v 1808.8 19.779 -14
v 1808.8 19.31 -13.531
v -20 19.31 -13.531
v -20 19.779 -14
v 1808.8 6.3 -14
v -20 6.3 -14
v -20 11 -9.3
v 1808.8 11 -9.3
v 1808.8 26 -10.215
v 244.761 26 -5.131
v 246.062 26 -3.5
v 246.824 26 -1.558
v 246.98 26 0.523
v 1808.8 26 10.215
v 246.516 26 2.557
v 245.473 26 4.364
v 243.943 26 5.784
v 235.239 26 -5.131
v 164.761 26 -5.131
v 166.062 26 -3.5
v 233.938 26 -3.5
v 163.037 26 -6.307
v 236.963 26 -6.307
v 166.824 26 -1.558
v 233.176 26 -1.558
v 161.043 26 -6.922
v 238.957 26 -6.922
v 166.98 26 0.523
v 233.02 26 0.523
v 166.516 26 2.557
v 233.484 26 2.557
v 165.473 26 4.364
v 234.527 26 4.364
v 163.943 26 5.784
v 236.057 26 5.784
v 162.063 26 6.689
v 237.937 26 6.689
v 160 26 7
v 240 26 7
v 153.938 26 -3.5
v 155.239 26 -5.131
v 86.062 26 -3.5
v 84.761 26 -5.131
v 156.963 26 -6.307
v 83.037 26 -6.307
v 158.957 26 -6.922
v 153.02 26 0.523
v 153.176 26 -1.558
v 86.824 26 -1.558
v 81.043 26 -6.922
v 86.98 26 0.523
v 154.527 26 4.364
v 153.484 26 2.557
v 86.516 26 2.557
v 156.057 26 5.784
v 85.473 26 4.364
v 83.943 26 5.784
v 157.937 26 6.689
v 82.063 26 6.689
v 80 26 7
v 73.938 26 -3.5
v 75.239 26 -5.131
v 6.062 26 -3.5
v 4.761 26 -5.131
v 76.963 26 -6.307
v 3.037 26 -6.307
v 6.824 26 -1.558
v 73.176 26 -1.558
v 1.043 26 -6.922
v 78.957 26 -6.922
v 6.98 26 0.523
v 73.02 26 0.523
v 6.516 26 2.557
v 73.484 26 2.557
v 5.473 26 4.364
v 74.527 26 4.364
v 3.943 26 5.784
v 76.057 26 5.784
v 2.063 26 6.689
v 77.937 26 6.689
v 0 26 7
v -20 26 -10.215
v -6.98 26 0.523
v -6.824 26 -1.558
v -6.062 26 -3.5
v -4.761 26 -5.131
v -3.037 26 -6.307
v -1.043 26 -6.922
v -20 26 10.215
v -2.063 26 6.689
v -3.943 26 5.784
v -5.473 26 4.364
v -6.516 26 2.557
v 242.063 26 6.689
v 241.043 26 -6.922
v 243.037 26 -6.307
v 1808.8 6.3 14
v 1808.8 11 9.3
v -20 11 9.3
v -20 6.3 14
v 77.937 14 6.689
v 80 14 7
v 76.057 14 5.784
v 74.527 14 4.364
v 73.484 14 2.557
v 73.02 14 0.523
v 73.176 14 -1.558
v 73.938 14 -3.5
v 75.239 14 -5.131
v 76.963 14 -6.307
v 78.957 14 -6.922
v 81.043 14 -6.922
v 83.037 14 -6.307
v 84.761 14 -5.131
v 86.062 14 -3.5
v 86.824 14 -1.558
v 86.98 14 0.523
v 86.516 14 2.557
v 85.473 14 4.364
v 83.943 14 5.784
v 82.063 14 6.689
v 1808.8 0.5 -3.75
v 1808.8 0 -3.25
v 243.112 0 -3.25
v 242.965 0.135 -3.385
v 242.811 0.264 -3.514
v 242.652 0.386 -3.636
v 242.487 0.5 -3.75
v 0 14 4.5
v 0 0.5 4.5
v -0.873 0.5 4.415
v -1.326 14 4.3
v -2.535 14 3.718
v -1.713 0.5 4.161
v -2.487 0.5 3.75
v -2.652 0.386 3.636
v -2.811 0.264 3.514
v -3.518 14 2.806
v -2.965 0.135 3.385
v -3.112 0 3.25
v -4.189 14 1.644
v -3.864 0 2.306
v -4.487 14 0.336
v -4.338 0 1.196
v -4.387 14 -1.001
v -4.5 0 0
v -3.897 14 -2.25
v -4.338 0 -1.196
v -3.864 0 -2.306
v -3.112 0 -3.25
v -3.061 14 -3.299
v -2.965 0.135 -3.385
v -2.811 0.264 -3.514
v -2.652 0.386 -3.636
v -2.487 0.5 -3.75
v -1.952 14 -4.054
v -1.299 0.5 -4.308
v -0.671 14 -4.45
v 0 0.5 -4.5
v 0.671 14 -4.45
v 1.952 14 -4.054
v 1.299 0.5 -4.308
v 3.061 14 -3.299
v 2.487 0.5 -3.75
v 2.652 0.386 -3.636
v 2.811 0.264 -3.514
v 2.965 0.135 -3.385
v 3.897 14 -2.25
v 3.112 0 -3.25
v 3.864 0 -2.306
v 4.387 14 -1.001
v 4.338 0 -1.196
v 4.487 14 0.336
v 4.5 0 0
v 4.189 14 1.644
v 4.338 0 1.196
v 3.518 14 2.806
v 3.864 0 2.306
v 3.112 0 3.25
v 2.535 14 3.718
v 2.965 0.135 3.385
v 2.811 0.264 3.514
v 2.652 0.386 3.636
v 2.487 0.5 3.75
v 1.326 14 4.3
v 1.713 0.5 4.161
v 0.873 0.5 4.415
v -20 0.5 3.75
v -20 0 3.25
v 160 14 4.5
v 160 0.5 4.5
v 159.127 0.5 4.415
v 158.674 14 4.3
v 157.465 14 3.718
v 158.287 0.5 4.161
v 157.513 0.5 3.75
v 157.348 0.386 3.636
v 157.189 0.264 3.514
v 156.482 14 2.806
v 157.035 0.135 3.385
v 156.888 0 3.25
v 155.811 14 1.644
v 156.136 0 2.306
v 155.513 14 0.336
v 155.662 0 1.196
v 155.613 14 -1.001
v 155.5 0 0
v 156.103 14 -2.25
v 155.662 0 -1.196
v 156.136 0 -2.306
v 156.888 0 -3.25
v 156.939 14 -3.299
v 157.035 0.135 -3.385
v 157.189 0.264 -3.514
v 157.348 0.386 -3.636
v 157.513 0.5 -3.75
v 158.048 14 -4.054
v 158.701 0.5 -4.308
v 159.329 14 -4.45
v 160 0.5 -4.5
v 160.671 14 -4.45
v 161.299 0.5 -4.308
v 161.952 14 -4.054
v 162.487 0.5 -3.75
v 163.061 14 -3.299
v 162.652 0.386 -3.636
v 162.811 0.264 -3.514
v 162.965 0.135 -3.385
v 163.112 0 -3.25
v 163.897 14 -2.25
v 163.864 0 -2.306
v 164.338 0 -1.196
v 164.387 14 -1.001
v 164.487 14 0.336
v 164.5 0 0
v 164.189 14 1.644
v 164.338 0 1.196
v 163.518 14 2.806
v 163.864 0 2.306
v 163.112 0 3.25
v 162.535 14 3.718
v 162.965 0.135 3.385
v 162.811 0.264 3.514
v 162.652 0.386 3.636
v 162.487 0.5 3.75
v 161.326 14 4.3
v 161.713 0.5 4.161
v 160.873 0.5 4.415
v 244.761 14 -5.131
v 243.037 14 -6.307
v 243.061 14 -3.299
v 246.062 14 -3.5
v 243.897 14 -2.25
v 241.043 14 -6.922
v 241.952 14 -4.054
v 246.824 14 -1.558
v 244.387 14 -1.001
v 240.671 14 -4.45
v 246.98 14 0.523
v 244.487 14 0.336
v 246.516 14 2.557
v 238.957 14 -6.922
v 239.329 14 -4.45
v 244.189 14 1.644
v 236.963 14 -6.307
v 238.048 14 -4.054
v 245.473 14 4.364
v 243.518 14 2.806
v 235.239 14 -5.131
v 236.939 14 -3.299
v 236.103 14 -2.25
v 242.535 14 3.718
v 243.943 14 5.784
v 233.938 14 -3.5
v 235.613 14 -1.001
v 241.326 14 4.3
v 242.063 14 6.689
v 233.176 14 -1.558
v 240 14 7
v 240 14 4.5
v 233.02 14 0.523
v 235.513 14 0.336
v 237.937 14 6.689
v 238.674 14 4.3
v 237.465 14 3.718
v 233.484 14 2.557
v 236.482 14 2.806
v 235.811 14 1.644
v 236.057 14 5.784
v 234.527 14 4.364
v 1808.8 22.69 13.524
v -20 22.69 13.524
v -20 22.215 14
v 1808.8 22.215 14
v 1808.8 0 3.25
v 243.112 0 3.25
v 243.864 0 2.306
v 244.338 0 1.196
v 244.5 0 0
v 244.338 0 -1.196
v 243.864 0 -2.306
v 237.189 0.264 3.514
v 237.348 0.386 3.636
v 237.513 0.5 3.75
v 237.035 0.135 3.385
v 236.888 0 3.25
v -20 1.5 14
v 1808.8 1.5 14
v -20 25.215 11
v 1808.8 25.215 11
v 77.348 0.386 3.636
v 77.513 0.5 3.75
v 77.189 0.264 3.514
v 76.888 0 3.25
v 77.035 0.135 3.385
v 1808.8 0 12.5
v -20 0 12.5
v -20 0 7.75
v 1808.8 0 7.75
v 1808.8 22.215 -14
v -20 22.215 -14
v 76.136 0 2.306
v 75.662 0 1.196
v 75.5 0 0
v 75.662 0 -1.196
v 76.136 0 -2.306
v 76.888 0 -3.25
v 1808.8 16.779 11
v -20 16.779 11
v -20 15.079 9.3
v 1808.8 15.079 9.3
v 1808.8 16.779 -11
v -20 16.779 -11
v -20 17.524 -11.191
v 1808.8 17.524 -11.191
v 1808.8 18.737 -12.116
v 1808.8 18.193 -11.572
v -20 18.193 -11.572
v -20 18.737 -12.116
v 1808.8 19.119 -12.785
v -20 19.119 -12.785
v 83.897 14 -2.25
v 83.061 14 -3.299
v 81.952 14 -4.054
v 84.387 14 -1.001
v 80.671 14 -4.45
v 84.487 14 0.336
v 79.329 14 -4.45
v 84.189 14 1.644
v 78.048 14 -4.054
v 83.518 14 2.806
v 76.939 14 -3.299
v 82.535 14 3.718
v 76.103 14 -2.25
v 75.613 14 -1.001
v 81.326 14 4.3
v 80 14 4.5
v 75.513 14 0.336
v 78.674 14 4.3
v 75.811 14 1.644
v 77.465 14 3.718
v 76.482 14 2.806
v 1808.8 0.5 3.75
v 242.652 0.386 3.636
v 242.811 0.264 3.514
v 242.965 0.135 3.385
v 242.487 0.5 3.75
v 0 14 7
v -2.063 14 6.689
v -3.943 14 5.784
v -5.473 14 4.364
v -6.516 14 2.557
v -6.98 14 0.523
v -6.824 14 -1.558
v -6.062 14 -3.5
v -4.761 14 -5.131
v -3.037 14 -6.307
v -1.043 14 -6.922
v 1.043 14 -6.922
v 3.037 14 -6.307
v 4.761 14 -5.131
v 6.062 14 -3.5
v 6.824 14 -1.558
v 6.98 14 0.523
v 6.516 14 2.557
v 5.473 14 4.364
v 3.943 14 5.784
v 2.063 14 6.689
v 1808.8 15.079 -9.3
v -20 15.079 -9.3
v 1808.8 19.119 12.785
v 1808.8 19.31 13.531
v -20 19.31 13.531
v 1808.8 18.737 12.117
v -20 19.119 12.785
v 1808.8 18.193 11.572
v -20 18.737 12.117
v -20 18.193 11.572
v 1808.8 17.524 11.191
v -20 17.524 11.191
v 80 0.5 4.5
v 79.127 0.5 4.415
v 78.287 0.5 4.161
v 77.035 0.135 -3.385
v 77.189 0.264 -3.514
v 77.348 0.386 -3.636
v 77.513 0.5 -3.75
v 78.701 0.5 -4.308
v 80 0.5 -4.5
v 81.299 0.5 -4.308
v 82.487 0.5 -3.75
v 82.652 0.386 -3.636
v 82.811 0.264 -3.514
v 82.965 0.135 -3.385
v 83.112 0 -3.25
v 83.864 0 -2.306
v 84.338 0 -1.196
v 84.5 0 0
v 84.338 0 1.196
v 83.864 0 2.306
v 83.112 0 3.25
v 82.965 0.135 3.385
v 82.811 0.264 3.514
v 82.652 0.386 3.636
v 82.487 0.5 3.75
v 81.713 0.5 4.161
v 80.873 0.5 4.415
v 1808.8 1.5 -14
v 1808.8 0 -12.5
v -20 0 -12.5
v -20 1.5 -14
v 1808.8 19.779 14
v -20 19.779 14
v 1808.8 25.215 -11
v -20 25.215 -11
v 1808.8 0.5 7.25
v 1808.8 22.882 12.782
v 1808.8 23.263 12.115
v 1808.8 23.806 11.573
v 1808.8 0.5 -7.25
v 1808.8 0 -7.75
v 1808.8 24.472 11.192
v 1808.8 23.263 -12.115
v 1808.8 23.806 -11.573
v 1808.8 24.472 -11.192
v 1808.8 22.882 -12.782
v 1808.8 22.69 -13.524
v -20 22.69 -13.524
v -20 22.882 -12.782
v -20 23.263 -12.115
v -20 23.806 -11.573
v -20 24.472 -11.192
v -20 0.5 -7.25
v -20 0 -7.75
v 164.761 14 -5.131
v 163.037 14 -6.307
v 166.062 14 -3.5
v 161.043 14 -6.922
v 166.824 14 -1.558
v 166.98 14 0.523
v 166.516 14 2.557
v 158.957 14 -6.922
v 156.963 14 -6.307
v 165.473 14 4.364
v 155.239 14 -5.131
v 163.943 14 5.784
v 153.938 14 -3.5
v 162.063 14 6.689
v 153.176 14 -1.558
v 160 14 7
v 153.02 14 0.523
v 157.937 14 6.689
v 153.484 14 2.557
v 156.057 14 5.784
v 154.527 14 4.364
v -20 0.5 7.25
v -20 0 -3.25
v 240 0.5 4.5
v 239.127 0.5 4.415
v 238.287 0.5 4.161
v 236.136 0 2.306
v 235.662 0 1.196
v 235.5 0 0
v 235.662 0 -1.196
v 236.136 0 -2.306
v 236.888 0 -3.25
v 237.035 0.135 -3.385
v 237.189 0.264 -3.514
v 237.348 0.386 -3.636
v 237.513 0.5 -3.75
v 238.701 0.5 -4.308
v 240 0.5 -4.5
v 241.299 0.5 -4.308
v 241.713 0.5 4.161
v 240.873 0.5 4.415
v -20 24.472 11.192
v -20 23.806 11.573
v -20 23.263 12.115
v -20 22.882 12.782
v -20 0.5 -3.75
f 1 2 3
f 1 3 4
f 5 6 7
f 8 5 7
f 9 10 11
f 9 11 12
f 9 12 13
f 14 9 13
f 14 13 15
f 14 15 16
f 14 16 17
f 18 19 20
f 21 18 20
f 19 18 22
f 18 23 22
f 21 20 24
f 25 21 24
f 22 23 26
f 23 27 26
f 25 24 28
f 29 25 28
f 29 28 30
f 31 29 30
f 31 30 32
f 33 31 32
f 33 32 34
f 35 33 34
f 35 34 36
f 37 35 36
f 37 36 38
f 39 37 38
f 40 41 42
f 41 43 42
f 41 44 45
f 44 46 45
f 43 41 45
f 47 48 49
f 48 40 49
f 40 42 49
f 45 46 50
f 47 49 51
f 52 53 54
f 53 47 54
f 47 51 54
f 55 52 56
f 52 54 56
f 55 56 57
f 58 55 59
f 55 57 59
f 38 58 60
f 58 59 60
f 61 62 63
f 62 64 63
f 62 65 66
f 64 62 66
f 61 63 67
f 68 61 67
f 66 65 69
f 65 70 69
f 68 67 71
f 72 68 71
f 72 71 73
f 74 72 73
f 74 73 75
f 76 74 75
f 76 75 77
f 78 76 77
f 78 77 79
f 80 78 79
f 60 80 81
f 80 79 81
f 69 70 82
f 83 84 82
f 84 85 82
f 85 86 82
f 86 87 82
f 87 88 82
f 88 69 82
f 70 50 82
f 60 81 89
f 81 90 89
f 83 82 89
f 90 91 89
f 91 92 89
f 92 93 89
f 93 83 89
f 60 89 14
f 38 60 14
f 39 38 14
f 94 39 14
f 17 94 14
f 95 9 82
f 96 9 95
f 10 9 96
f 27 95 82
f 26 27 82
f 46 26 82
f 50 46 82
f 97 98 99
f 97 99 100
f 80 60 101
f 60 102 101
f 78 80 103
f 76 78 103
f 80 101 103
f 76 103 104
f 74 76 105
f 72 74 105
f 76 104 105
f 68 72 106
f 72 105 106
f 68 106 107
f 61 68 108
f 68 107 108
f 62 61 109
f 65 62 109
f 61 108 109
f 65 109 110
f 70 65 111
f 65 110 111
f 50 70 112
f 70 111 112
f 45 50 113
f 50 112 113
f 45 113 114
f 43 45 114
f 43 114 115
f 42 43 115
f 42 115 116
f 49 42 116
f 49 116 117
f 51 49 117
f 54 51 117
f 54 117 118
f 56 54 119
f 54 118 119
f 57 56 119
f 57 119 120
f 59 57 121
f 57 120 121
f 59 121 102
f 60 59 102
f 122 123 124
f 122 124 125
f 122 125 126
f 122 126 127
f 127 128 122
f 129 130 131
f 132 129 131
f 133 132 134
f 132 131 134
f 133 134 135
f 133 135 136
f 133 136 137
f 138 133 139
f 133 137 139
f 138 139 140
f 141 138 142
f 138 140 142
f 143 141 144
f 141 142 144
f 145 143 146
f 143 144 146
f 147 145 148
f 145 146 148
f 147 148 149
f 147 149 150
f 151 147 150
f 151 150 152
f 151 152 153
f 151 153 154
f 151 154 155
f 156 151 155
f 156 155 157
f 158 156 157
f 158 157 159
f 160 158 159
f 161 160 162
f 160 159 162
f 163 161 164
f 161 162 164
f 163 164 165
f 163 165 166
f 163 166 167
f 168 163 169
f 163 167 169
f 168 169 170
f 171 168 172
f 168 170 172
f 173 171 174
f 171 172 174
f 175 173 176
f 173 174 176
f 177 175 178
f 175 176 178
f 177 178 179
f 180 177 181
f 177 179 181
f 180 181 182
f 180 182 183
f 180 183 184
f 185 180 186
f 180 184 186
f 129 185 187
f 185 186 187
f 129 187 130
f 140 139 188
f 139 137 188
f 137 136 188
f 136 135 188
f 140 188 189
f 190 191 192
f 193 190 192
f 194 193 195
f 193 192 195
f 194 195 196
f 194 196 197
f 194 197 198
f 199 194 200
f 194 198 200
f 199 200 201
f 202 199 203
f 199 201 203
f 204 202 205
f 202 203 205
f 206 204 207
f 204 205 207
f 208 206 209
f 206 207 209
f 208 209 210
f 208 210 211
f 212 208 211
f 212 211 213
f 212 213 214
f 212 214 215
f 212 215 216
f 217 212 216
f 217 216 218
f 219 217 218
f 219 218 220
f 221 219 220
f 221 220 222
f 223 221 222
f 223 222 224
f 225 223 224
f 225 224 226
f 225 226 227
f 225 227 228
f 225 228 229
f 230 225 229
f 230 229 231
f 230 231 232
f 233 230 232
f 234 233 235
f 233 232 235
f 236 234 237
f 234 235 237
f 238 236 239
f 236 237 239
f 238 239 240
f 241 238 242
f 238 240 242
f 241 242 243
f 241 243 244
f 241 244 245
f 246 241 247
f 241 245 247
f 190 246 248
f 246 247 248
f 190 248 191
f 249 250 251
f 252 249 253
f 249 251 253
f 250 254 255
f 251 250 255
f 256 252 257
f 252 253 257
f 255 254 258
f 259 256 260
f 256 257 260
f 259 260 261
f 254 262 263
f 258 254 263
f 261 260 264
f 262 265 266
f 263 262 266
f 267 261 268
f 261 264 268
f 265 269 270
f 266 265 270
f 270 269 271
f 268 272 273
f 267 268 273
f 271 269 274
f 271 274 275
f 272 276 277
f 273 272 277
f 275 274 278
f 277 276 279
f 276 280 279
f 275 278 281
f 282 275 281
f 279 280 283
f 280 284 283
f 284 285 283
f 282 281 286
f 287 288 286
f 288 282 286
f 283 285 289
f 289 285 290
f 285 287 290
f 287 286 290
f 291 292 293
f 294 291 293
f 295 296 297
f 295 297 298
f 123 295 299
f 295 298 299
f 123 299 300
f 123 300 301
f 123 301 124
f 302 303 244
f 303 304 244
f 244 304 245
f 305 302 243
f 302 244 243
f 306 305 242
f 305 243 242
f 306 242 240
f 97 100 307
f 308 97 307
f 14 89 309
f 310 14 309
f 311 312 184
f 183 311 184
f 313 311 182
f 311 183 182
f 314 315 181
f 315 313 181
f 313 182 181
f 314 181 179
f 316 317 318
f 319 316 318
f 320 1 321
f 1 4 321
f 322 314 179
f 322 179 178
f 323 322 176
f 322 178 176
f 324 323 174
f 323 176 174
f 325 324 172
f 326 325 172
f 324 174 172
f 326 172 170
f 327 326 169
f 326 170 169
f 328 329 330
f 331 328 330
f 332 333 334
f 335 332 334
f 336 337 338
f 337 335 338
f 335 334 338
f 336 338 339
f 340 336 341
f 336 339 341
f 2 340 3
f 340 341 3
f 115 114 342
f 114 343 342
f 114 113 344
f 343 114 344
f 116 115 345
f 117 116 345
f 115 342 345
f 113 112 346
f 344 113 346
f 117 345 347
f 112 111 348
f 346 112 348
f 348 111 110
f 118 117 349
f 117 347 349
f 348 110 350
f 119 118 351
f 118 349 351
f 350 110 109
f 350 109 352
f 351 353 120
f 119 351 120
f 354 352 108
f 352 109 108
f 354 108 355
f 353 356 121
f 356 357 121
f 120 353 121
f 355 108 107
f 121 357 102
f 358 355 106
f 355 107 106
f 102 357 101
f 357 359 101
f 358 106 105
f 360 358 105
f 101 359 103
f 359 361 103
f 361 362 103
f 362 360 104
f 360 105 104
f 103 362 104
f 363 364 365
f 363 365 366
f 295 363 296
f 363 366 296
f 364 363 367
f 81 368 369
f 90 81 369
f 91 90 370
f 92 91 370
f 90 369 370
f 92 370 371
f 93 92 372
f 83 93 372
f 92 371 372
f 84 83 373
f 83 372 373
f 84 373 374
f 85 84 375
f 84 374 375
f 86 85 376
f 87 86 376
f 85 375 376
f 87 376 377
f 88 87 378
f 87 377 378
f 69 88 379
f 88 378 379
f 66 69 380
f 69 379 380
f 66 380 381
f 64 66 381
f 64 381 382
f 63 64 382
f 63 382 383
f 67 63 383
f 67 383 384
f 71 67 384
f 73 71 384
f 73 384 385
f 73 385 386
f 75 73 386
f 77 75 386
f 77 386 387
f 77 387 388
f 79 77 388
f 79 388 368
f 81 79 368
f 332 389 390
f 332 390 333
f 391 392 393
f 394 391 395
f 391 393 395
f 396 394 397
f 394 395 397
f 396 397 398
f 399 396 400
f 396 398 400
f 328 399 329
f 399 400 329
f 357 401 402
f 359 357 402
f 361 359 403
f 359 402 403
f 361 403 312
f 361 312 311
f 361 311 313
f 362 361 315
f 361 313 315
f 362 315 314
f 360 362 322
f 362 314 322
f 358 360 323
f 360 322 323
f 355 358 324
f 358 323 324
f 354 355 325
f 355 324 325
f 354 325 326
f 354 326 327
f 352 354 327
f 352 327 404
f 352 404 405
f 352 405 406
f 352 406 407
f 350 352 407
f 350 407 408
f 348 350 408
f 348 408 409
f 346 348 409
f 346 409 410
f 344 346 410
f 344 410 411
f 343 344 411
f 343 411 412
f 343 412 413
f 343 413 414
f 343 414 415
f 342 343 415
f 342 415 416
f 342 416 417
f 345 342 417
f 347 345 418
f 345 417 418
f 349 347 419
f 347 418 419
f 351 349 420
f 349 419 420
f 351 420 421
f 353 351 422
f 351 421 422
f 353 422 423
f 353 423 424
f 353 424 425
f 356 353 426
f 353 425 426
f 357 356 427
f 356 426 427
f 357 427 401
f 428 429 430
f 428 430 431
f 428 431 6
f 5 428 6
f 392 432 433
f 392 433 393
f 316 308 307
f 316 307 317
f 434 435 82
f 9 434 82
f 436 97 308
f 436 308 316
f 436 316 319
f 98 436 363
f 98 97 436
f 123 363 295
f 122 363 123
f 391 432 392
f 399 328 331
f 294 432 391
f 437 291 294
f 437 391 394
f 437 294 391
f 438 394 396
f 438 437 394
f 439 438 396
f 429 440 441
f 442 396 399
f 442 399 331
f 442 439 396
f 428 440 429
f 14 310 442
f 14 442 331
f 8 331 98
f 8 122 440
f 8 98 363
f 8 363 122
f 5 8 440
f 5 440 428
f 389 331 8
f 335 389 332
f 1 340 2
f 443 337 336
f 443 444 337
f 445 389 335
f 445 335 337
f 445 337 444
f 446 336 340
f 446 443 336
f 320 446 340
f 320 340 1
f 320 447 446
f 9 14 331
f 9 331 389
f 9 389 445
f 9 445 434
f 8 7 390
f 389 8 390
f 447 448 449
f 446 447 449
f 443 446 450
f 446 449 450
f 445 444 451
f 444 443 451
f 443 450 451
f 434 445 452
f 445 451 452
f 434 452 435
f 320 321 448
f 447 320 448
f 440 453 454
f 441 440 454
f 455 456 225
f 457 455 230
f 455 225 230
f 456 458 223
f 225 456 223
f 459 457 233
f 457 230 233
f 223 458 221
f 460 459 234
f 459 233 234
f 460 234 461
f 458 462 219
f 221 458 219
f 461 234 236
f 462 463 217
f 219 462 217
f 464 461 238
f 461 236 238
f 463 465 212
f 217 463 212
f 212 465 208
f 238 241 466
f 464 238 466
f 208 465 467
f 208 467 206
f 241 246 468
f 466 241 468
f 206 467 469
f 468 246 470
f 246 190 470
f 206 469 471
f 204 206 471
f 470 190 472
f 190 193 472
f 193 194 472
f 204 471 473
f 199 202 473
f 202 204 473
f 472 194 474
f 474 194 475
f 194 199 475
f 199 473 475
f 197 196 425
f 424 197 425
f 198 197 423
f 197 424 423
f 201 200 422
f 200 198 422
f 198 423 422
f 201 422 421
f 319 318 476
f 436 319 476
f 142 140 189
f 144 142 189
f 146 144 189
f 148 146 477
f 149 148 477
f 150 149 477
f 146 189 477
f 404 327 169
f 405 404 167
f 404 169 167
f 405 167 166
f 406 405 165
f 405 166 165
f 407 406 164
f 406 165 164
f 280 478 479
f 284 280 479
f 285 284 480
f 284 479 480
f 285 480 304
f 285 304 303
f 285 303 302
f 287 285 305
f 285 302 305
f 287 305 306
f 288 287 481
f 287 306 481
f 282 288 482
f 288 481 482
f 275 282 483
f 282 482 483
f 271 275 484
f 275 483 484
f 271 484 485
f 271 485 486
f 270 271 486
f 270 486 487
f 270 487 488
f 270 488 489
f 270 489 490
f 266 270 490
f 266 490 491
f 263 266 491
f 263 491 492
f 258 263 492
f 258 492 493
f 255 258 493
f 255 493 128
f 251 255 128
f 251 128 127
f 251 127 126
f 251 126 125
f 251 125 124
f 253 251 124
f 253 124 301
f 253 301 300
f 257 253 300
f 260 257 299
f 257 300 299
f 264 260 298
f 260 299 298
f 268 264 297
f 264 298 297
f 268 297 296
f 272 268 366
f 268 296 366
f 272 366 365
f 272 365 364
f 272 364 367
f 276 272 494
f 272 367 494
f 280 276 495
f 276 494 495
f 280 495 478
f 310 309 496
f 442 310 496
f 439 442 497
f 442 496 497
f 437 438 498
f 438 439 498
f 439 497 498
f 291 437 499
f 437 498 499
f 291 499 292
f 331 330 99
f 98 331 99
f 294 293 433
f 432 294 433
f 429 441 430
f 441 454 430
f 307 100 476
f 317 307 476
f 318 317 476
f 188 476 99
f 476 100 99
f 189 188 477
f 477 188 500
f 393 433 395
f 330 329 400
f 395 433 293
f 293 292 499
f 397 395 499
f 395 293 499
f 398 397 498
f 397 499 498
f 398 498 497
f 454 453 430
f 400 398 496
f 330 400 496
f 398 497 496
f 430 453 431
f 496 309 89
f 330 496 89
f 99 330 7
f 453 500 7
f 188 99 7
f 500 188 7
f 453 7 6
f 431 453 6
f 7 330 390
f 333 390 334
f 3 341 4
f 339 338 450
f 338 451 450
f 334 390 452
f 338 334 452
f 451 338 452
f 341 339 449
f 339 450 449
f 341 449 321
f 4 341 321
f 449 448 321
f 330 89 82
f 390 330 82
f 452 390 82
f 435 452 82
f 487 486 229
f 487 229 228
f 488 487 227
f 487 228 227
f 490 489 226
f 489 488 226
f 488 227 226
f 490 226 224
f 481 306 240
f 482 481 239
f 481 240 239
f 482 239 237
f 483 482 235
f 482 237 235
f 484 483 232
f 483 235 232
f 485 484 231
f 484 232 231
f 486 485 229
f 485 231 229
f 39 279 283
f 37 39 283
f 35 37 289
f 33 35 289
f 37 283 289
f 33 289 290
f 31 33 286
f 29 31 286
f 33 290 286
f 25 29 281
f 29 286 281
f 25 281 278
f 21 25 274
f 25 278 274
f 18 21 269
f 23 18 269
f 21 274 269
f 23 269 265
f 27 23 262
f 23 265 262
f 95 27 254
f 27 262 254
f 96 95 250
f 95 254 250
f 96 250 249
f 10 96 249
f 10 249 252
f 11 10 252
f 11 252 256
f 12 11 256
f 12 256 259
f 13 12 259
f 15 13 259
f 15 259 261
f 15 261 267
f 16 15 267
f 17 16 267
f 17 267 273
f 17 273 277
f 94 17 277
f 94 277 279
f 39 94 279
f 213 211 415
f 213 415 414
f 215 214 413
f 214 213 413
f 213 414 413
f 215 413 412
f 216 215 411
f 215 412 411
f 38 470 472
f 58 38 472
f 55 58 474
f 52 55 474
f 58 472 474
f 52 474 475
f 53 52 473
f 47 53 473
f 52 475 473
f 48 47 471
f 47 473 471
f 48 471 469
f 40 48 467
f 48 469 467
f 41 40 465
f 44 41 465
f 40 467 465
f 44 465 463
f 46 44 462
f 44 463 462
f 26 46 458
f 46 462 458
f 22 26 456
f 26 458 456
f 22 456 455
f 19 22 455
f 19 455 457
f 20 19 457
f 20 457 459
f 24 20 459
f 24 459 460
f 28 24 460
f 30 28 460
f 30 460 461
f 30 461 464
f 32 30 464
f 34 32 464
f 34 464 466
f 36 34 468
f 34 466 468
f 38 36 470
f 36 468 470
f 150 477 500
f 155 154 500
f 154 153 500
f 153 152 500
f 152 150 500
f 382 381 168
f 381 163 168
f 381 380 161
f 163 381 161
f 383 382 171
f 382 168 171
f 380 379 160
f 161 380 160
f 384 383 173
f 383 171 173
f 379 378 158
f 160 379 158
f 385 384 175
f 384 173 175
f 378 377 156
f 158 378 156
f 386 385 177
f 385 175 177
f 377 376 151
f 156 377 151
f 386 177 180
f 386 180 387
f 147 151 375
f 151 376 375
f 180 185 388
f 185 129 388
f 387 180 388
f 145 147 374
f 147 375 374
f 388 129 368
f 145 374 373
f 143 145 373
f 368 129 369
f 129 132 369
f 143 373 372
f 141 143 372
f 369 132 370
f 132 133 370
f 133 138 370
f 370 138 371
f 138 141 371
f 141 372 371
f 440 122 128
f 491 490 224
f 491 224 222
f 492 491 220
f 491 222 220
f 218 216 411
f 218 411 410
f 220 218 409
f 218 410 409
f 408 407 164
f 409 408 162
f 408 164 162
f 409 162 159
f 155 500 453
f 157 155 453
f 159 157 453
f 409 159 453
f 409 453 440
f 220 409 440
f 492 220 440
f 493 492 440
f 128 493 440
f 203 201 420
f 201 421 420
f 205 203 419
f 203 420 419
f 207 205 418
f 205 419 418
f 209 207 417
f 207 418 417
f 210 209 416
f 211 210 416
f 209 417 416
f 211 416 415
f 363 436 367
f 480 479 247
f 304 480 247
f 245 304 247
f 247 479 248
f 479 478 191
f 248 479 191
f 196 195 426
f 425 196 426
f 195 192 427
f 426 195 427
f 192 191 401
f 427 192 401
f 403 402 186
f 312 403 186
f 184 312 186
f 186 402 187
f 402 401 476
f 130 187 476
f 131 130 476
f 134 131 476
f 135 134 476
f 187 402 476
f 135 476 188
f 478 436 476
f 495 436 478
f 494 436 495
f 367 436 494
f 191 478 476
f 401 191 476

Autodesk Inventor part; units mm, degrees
sketch "Sketch_17" plane through (-20, 0, 0) normal (1, 0, 0) x (0, 0, -1)
  line L0 (-14, 1.5) -> (-12.5, 0)
  line L1 (-12.5, 0) -> (-7.75, 0)
  line L2 (-7.75, 0) -> (-7.25, 0.5)
  line L3 (-7.25, 0.5) -> (-3.75, 0.5)
  line L4 (-3.75, 0.5) -> (-3.25, 0)
  line L5 (-3.25, 0) -> (3.25, 0)
  line L6 (3.25, 0) -> (3.75, 0.5)
  line L7 (3.75, 0.5) -> (7.25, 0.5)
  line L8 (7.25, 0.5) -> (7.75, 0)
  line L9 (7.75, 0) -> (12.5, 0)
  line L10 (12.5, 0) -> (14, 1.5)
  line L11 (14, 1.5) -> (14, 6.3)
  line L12 (14, 6.3) -> (9.3003, 10.9996)
  line L13 (9.3003, 10.9996) -> (9.3003, 15.0794)
  line L14 (9.3003, 15.0794) -> (10.9996, 16.7787)
  arc A0 (13.5309, 19.31) -> (10.9996, 16.7787) centre (13.8696, 16.4399) ccw
  line L15 (13.5309, 19.31) -> (14, 19.7791)
  line L16 (14, 19.7791) -> (14, 22.215)
  line L17 (14, 22.215) -> (13.5245, 22.6905)
  arc A1 (11.0003, 25.2147) -> (13.5245, 22.6905) centre (13.8696, 25.5598) ccw
  line L18 (11.0003, 25.2147) -> (10.215, 26)
  line L19 (10.215, 26) -> (-10.215, 26)
  line L20 (-10.215, 26) -> (-11.0003, 25.2147)
  arc A2 (-13.5245, 22.6905) -> (-11.0003, 25.2147) centre (-13.8696, 25.5598) ccw
  line L21 (-13.5245, 22.6905) -> (-14, 22.215)
  line L22 (-14, 22.215) -> (-14, 19.7791)
  line L23 (-14, 19.7791) -> (-13.5309, 19.31)
  arc A3 (-10.9996, 16.7787) -> (-13.5309, 19.31) centre (-13.8696, 16.4399) ccw
  line L24 (-10.9996, 16.7787) -> (-9.3003, 15.0794)
  line L25 (-9.3003, 15.0794) -> (-9.3003, 10.9996)
  line L26 (-9.3003, 10.9996) -> (-14, 6.3)
  line L27 (-14, 6.3) -> (-14, 1.5)
extrude "Extrusion1" add sketch "Sketch_17" along normal blind 1828.8
sketch "Sketch2" plane through (-20, 26, 10.215) normal (0, 1, 0) x (1, 0, 0)
  point P0 (20, 10.215)
hole "Hole1" at (0, 26, 0) direction (0, -1, 0) diameter 9 depth 26 counterbore diameter 14 counterbore depth 12
pattern_linear "Rectangular Pattern1" count 4 spacing 80 along (1, 0, 0) of "Hole1"
ref_plane "4dummy_XY" through (0, 0, 0) normal (1, 0, 0) x (0, 0, -1)
ref_plane "4dummy_YZ" through (0, 0, 0) normal (0, 0, -1) x (0, 1, 0)
ref_plane "4dummy_ZX" through (0, 0, 0) normal (0, 1, 0) x (1, 0, 0)
ref_plane "4slide_XY" through (-20, 7, 0) normal (1, 0, 0) x (0, 0, -1)
ref_plane "4slide_YZ" through (-20, 7, 0) normal (0, 0, -1) x (0, 1, 0)
ref_plane "4slide_ZX" through (-20, 7, 0) normal (0, 1, 0) x (1, 0, 0)
ref_plane "4track_XY" through (0, 0, 0) normal (0, 0, 1) x (1, 0, 0)
ref_plane "4track_YZ" through (0, 0, 0) normal (1, 0, 0) x (0, 1, 0)
ref_plane "4track_ZX" through (0, 0, 0) normal (0, 1, 0) x (0, 0, 1)
properties part number "HSR30A128020 Rail"
